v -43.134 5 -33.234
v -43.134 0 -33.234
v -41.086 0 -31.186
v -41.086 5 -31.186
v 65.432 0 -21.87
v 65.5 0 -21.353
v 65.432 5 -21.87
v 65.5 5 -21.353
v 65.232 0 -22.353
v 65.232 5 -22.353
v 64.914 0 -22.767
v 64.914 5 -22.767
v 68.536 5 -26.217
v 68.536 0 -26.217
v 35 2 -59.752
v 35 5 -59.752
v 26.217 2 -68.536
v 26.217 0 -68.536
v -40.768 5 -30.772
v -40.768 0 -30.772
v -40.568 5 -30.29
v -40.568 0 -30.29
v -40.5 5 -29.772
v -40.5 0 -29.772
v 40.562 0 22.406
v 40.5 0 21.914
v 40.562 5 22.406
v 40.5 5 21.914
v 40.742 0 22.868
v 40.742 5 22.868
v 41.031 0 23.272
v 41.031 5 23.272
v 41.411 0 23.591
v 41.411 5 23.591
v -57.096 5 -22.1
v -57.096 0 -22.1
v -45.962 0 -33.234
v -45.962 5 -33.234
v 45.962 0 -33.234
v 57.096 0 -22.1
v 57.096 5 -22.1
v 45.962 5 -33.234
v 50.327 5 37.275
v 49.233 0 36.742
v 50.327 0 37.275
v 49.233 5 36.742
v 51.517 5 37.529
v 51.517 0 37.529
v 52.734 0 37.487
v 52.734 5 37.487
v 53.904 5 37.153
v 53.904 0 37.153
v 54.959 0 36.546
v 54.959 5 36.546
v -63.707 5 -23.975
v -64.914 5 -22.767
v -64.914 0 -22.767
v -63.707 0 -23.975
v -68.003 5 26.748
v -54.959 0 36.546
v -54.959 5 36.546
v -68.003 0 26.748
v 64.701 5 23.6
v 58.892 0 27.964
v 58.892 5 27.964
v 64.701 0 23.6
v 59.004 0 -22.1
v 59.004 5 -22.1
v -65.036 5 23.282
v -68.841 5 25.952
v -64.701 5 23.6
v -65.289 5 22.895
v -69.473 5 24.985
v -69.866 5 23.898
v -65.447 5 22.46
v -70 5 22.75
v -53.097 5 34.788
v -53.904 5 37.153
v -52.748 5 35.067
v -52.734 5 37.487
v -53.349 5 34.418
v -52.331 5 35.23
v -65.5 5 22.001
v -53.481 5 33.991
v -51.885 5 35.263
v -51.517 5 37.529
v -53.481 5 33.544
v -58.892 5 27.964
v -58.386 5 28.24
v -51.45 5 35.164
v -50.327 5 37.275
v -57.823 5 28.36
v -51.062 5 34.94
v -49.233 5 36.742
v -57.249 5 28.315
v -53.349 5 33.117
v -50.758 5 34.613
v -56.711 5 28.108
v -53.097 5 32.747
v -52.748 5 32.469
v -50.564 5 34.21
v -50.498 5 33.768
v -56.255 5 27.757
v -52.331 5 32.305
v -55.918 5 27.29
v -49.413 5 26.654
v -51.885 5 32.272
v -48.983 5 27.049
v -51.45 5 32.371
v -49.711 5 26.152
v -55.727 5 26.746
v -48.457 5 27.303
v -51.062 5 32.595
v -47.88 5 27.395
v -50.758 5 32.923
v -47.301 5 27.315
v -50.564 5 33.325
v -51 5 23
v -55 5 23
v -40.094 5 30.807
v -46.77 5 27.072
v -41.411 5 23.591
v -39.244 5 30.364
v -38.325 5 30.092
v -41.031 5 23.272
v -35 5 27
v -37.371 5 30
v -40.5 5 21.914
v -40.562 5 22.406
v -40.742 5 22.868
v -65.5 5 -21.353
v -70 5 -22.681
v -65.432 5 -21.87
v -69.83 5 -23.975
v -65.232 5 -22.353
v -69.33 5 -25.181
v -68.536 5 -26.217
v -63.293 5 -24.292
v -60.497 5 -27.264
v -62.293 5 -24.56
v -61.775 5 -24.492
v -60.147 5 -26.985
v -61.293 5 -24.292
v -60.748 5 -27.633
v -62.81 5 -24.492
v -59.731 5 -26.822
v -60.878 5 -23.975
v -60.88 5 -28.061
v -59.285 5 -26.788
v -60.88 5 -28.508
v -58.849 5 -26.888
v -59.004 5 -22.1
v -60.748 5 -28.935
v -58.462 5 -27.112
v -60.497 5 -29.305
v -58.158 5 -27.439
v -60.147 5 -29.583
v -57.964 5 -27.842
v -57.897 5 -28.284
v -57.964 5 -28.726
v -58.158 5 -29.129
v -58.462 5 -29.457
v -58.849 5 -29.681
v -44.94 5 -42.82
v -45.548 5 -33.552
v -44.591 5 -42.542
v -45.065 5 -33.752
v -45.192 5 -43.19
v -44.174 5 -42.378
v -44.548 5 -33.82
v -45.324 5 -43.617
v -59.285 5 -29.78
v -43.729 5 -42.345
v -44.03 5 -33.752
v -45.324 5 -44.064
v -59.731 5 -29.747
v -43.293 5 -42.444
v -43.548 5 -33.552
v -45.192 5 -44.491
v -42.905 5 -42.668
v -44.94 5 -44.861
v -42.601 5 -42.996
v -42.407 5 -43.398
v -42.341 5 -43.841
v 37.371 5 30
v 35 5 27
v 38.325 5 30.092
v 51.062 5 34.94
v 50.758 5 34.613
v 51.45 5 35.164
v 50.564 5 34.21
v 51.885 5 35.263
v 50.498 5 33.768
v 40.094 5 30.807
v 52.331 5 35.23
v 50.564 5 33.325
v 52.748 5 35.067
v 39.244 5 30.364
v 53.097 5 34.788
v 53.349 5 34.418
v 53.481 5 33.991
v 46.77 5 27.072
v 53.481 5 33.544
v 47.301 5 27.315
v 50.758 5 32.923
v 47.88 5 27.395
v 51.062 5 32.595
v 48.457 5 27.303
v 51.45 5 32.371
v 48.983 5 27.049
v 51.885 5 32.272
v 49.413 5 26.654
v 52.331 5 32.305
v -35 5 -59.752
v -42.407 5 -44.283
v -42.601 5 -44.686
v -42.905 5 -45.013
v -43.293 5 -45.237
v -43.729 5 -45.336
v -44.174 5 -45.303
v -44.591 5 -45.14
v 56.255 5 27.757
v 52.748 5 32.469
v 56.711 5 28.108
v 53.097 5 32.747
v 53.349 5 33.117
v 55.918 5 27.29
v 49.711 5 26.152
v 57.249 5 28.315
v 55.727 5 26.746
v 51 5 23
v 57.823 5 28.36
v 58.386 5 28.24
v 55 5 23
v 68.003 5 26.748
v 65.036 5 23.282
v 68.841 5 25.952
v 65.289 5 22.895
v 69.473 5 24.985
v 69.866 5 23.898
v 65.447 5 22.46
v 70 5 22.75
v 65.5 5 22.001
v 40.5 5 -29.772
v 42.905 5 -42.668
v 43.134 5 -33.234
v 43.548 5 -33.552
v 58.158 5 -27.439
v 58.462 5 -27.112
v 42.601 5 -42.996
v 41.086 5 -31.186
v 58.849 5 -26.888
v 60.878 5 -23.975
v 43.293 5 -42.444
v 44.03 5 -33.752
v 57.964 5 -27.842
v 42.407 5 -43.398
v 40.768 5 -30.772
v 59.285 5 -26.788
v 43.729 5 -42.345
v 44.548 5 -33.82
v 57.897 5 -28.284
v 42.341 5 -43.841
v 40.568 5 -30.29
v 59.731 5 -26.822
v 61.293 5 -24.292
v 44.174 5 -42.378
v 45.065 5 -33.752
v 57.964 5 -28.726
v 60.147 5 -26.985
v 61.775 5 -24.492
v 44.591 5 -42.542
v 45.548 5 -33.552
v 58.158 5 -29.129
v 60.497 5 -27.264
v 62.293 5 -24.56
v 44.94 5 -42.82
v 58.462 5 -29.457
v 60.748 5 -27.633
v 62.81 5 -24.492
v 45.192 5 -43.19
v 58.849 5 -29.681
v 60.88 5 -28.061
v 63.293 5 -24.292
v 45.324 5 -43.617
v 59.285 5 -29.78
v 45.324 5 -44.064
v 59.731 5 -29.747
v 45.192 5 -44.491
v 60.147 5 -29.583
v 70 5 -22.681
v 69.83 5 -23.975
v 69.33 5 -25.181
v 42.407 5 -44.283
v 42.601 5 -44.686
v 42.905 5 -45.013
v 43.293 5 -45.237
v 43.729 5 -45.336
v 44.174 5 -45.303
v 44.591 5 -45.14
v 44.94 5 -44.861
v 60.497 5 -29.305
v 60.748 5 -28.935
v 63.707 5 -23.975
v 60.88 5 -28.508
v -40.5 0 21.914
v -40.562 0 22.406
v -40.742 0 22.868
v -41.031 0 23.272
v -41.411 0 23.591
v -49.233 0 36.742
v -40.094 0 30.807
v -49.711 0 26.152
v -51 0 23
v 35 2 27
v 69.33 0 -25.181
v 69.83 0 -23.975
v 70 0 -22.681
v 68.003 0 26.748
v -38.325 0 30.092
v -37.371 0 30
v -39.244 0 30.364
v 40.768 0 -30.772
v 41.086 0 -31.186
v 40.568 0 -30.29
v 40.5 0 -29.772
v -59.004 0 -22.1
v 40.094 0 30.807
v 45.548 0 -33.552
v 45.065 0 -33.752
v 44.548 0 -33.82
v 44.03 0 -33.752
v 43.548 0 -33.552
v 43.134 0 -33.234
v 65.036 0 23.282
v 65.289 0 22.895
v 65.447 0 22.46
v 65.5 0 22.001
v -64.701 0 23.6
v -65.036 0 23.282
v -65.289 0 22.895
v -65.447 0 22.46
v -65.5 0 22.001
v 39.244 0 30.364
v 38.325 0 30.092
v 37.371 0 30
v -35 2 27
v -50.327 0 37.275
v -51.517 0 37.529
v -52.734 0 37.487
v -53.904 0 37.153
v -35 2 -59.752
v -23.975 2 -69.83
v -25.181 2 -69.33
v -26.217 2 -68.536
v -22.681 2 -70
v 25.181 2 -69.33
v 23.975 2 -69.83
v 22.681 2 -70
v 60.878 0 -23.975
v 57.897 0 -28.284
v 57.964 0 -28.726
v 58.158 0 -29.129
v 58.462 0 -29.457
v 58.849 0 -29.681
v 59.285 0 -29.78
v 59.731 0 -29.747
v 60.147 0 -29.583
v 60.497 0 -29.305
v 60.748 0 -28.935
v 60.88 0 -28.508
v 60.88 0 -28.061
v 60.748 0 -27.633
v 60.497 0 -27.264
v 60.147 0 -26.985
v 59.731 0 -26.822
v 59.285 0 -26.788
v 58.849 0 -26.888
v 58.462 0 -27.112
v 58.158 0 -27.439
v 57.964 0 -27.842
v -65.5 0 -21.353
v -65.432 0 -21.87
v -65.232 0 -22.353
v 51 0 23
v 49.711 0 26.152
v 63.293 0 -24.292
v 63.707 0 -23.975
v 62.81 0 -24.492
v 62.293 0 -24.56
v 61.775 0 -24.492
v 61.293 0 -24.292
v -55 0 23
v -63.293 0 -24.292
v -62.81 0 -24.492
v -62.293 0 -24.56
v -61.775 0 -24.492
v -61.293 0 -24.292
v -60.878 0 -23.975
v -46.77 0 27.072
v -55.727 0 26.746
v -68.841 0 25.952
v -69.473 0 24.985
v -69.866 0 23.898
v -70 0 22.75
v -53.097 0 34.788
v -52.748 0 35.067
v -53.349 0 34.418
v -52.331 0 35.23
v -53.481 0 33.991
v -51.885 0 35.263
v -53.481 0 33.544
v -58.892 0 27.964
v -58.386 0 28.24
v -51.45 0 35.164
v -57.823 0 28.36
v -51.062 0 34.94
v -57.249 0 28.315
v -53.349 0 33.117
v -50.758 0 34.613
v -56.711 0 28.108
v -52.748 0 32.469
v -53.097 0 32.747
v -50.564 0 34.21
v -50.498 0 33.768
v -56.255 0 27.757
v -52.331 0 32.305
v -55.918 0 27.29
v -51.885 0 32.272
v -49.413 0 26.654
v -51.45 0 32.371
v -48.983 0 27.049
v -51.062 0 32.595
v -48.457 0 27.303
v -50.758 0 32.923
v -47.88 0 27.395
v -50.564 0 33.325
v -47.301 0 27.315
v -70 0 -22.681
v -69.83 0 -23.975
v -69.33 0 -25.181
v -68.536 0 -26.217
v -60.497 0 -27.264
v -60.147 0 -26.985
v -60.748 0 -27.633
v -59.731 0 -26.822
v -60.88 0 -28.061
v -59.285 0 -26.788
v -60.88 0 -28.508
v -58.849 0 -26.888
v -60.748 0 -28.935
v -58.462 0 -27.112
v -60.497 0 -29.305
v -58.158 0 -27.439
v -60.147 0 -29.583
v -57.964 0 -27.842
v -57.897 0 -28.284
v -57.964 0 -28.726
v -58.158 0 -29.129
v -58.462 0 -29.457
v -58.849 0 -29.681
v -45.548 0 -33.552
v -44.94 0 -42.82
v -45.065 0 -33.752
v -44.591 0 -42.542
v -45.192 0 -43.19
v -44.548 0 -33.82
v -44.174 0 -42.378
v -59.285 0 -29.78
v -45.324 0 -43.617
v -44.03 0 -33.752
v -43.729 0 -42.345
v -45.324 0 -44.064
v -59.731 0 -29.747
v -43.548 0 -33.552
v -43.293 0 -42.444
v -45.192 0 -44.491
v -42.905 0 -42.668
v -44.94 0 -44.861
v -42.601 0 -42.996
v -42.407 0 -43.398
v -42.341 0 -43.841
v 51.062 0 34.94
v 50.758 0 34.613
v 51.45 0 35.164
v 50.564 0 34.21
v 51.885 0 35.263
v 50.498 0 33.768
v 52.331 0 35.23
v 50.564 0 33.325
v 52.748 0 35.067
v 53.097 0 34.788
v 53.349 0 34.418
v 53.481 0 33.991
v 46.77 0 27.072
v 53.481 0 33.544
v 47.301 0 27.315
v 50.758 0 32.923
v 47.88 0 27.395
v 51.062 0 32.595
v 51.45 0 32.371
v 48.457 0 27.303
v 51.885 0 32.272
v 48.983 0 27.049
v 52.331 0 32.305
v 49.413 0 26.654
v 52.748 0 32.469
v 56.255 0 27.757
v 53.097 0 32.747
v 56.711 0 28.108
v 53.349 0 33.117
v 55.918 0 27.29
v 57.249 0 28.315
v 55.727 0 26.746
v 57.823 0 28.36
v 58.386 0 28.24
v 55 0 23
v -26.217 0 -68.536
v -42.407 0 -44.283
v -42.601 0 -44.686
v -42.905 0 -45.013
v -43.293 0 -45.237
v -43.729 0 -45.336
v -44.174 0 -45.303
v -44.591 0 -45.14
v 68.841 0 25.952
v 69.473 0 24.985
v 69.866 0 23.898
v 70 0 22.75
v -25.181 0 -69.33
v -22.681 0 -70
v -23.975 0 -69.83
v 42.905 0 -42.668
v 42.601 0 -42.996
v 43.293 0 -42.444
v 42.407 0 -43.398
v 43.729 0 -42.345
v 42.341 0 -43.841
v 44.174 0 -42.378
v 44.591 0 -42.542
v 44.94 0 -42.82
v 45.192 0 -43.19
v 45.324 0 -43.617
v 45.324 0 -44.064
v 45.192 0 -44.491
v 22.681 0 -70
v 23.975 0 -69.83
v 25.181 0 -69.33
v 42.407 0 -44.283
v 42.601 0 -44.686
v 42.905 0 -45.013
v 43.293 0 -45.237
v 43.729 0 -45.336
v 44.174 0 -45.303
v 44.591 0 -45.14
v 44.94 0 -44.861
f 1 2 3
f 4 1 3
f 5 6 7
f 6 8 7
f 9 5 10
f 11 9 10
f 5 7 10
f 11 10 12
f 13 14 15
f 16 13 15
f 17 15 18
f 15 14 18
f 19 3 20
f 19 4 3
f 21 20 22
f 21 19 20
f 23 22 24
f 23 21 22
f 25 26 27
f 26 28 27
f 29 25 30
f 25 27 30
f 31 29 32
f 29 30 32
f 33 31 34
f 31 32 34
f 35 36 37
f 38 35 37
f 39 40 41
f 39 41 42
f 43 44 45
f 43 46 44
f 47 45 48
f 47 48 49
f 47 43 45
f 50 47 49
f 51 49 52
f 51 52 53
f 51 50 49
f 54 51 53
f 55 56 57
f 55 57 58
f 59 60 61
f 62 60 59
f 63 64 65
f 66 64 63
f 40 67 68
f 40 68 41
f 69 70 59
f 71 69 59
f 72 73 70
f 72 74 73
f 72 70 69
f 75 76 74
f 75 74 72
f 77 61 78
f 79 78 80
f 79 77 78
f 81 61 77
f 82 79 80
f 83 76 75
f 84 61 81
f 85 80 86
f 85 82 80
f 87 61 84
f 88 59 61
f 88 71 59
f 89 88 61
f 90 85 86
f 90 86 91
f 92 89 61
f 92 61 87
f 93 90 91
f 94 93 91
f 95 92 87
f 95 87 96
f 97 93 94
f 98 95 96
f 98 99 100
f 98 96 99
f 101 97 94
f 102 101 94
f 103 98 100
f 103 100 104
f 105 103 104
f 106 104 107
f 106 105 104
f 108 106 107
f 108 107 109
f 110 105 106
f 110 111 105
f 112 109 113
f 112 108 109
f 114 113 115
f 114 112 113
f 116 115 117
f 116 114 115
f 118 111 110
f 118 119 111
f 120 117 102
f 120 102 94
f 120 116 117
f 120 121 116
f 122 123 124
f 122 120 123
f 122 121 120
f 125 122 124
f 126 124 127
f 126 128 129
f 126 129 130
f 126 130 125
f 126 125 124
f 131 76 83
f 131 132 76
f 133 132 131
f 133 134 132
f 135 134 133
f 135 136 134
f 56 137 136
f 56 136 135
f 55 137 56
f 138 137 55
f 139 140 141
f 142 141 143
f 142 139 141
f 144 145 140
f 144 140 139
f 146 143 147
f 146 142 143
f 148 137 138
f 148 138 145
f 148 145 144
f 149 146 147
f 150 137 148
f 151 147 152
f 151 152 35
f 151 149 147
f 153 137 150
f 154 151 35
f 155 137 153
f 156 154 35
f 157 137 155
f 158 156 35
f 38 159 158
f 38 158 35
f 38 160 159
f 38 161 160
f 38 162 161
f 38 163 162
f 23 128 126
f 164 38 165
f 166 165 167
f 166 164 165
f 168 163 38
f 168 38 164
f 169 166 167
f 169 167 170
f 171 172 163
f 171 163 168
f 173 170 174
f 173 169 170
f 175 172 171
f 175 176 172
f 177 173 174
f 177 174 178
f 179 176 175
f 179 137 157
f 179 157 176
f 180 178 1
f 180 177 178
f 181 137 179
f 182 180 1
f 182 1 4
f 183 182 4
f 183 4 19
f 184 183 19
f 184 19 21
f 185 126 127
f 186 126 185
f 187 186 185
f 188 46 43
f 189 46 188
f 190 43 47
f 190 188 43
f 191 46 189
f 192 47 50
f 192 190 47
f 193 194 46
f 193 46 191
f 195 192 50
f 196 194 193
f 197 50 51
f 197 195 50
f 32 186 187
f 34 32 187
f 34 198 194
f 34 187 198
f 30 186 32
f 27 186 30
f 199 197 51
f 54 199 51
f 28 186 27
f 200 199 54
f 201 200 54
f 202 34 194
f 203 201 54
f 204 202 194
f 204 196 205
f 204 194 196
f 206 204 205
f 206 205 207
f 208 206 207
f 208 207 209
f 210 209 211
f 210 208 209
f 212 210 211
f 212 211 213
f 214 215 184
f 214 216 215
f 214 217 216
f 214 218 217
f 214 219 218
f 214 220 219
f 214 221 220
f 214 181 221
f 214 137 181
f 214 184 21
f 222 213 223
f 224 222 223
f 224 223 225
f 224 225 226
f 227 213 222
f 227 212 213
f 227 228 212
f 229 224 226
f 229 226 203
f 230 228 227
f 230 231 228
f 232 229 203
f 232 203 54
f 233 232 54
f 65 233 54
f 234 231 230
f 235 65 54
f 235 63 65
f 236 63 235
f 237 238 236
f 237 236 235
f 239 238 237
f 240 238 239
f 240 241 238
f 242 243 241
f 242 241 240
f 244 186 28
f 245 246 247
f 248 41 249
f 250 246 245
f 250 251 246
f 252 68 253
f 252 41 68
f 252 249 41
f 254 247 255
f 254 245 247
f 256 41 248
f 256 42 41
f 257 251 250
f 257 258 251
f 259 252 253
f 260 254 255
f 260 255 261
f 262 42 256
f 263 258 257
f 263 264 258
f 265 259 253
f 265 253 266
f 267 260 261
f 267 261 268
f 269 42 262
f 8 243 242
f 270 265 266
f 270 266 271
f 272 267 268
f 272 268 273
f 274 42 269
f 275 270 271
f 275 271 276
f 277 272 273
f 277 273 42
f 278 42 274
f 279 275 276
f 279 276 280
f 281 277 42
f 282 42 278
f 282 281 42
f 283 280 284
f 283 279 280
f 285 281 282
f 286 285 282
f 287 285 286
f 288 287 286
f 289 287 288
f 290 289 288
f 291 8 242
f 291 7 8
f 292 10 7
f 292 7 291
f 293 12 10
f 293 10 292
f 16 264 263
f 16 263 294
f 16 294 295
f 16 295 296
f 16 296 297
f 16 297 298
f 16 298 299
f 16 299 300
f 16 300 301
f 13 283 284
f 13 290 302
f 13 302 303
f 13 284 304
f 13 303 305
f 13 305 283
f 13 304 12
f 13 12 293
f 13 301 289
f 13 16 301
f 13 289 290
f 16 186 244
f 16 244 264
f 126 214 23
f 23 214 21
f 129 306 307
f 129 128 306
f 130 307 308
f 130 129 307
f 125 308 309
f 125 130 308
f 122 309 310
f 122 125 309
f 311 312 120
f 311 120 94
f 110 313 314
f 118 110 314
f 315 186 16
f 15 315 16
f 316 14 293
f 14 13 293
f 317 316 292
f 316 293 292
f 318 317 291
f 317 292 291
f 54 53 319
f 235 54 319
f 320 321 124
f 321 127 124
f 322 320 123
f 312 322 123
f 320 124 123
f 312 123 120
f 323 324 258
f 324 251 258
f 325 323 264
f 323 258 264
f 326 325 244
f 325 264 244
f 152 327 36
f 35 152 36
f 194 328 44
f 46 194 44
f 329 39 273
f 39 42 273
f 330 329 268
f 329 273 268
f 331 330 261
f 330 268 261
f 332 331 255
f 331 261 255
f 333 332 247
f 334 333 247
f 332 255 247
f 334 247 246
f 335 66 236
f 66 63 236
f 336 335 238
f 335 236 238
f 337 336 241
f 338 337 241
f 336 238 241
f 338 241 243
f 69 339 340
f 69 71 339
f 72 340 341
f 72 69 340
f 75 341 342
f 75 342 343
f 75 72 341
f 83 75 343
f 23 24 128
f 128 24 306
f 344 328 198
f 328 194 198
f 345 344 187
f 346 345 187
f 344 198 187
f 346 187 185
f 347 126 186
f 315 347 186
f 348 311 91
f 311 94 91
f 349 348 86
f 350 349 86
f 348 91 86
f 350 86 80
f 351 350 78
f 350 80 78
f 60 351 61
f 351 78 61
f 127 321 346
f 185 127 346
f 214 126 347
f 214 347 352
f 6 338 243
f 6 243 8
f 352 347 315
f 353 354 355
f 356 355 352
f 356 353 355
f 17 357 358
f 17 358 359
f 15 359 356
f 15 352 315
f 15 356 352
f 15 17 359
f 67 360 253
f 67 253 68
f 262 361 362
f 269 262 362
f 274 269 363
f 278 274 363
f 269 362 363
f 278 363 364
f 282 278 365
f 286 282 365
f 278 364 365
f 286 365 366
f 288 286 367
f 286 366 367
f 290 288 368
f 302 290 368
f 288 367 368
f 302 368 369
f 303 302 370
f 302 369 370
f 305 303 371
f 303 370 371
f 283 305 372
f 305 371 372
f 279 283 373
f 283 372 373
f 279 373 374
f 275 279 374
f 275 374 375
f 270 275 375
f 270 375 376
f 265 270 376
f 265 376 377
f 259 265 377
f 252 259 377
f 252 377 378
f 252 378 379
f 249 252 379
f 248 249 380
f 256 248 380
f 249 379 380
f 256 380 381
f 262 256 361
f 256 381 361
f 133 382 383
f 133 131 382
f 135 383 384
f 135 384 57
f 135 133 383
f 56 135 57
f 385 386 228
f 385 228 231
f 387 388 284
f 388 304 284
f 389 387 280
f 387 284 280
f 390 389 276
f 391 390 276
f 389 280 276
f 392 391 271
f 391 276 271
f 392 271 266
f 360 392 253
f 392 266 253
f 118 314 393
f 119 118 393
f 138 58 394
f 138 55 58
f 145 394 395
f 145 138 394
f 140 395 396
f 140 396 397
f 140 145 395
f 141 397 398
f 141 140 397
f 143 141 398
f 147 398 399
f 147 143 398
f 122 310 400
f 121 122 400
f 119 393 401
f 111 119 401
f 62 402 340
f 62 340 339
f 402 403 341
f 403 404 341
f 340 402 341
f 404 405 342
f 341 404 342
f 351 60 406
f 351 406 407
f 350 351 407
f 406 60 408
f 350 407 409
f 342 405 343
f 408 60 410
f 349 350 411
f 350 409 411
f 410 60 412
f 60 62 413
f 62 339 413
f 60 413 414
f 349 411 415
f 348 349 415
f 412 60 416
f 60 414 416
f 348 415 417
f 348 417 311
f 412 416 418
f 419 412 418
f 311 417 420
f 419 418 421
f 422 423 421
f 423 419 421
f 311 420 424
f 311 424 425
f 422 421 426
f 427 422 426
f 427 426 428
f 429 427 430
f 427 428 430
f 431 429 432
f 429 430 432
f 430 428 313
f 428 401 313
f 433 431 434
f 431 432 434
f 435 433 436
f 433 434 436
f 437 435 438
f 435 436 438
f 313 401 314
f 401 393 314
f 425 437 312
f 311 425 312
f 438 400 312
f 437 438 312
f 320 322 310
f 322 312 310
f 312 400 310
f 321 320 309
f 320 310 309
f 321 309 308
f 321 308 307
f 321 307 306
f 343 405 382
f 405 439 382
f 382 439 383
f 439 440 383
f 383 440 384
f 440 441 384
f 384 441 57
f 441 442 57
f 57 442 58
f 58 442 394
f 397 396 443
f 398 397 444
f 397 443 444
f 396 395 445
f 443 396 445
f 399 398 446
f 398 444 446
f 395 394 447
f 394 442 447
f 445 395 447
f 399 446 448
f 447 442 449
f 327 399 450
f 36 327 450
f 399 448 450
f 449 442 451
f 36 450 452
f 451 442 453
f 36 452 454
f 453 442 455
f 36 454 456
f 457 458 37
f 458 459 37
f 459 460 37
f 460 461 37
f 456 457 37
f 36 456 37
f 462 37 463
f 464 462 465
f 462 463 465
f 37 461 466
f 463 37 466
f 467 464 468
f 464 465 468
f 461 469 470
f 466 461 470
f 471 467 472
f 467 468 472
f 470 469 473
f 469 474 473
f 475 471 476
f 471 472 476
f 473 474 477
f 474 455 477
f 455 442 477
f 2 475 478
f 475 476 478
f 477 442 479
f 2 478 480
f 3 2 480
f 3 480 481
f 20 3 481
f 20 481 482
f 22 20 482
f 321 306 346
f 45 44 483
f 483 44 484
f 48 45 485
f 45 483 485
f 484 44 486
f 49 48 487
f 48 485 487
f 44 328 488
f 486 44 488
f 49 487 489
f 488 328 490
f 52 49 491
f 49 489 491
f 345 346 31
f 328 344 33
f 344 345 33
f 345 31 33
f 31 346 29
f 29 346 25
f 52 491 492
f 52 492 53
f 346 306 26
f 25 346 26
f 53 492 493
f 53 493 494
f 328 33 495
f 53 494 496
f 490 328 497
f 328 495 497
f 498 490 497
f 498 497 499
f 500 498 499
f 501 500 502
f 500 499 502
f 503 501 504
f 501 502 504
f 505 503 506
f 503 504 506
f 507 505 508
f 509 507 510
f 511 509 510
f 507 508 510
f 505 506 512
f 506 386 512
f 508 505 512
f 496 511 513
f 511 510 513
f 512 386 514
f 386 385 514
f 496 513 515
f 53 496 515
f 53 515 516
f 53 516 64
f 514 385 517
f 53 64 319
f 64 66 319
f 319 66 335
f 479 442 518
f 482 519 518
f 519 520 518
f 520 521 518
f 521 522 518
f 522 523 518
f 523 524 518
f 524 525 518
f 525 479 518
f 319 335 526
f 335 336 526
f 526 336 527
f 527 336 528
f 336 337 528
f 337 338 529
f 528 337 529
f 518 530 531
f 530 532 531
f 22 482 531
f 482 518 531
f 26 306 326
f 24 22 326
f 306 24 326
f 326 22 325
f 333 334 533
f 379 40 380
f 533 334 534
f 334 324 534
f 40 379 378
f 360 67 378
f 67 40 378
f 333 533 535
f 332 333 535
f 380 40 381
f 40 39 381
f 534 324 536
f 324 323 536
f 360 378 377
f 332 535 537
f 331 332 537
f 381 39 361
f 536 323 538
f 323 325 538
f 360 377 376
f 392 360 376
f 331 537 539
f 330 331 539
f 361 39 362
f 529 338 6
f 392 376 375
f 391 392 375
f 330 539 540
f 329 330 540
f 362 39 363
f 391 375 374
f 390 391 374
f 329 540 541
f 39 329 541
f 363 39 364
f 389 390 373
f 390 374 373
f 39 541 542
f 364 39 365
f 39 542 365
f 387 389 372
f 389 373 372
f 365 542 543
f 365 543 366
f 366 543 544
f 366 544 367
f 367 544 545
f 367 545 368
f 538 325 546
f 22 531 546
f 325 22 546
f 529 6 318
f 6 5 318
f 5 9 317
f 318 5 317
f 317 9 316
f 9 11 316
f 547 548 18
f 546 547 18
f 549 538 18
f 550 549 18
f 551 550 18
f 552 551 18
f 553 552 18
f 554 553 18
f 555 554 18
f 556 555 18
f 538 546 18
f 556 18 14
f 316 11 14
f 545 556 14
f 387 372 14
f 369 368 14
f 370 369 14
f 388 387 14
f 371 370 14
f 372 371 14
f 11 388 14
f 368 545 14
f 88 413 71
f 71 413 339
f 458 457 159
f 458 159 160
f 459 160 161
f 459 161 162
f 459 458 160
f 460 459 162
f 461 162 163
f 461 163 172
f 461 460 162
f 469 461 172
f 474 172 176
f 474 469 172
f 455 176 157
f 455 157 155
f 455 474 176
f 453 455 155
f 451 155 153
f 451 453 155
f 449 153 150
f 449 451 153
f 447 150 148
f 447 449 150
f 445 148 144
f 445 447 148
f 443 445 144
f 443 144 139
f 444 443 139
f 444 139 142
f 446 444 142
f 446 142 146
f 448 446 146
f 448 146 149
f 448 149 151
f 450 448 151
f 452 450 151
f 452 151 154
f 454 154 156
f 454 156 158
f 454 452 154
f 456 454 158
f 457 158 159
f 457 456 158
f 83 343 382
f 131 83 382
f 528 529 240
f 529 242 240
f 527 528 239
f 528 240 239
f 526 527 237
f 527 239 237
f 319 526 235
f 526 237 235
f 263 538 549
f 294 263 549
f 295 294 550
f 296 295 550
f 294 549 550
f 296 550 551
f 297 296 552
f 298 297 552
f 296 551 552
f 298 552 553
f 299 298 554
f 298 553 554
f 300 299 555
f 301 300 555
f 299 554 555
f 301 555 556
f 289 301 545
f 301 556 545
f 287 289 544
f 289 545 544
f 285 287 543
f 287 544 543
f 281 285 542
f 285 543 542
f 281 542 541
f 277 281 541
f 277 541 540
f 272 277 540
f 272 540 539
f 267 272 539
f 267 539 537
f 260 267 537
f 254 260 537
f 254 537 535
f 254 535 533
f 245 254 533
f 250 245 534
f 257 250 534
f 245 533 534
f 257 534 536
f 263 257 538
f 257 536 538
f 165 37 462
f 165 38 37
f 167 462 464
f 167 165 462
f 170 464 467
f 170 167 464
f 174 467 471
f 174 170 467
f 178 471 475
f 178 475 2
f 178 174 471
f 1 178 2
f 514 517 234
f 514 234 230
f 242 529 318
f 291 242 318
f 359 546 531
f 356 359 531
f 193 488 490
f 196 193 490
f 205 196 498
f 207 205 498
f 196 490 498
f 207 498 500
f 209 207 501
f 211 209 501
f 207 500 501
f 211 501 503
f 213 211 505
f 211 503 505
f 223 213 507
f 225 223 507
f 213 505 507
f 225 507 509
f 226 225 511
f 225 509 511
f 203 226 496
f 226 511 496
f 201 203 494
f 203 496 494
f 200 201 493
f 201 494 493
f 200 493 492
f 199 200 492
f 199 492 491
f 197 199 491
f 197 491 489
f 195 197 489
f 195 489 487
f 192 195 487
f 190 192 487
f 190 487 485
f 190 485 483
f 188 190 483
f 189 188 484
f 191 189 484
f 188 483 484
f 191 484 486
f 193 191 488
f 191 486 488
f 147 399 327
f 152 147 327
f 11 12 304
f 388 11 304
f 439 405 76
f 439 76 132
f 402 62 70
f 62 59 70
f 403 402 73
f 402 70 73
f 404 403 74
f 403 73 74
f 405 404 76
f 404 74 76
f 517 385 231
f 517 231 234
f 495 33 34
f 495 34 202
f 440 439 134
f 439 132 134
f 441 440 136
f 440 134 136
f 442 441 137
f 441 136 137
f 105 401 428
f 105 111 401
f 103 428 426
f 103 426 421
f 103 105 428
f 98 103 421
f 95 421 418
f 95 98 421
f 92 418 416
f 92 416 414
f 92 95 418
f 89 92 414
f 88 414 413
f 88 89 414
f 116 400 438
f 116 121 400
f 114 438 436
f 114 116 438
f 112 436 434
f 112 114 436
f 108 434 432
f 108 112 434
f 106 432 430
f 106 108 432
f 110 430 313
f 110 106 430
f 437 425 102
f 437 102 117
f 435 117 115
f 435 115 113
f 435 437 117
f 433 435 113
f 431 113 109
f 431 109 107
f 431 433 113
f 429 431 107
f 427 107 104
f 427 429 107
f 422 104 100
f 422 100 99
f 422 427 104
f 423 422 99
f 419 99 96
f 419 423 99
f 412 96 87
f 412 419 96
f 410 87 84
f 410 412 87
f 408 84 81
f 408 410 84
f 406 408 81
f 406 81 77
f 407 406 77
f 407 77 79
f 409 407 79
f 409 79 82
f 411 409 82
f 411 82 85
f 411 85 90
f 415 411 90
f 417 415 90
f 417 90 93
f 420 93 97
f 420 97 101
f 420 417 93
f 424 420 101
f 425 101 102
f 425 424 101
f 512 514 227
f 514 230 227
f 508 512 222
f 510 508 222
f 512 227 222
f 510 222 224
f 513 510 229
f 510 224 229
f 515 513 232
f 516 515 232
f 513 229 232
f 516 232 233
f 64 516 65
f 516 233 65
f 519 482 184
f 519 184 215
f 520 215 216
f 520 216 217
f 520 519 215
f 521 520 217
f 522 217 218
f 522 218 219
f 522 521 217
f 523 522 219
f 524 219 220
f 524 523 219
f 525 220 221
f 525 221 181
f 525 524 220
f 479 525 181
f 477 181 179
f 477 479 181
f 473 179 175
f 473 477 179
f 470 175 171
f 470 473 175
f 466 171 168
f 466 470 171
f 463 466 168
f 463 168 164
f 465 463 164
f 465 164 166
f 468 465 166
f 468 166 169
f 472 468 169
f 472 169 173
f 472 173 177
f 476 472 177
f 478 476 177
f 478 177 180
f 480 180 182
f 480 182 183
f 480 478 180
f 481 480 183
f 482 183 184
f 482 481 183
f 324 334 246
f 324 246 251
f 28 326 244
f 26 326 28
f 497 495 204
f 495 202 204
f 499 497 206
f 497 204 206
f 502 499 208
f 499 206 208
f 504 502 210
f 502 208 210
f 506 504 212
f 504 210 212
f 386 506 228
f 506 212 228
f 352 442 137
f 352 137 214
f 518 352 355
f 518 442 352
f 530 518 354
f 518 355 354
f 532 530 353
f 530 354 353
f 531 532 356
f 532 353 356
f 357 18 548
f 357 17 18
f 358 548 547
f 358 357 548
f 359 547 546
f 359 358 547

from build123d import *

# Parameters (mm, degrees)
SKETCH1_R            = 1.5
BOSS_EXTRUDE1_DEPTH  = 5
FILLET1_R            = 2
FILLET1_OF_MIRROR1_R = 2
SKETCH2_W            = 70
SKETCH2_H            = 97
CUT_EXTRUDE1_DEPTH   = 3
FILLET2_R            = 5


with BuildPart() as part:
    # Sketch1 → Boss-Extrude1 (new body)
    with BuildSketch(Plane(origin=(0, 0, 0), x_dir=(1, 0, 0), z_dir=(0, 1, 0))):
        Polygon((-52.164149312, -38.645247828), (-70, -25.247940817), (-70, 24.752308679), (-24.752308679, 70), (0, 70), (0, -30), (-38.851635079, -30), align=None)
        with Locations((-43.840620434, 43.840620434)):
            Circle(SKETCH1_R, mode=Mode.SUBTRACT)
        with Locations((-51.997575213, -33.767620171)):
            Circle(SKETCH1_R, mode=Mode.SUBTRACT)
        with Locations((-59.39696962, 28.284271247)):
            Circle(SKETCH1_R, mode=Mode.SUBTRACT)
        Polygon((-59.003765723, 22.1), (-57.095959493, 22.1), (-44.547727215, 34.648232278), (-40.5, 30.600505063), (-40.5, -23), (-48.796166422, -28.387593469), (-51, -23), (-55, -23), (-56.33662338, -29.883022962), (-65.5, -23), (-65.5, 22.181240867), (-62.292503295, 25.388737572), align=None, mode=Mode.SUBTRACT)
    boss_extrude1 = extrude(amount=BOSS_EXTRUDE1_DEPTH)

    # Fillet1
    fillet1_edges = [part.edges().sort_by_distance(p)[0] for p in [
        (-44.547727215, 2.5, -34.648232278),
        (-62.292503295, 2.5, -25.388737572),
        (-65.5, 2.5, -22.181240867),
        (-65.5, 2.5, 23),
        (-56.33662338, 2.5, 29.883022962),
        (-48.796166422, 2.5, 28.387593469),
        (-40.5, 2.5, 23),
        (-40.5, 2.5, -30.600505063),
    ]]
    fillet(fillet1_edges, radius=FILLET1_R)

    # Mirror1: Boss-Extrude1 across plane
    add(boss_extrude1.mirror(Plane(origin=(0, 5, 30), x_dir=(0, 0, 1), z_dir=(-1, 0, 0))))

    # Fillet1 of Mirror1
    fillet1_of_mirror1_edges = [part.edges().sort_by_distance(p)[0] for p in [
        (44.547727215, 2.5, -34.648232278),
        (62.292503295, 2.5, -25.388737572),
        (65.5, 2.5, -22.181240867),
        (65.5, 2.5, 23),
        (56.33662338, 2.5, 29.883022962),
        (48.796166422, 2.5, 28.387593469),
        (40.5, 2.5, 23),
        (40.5, 2.5, -30.600505063),
    ]]
    fillet(fillet1_of_mirror1_edges, radius=FILLET1_OF_MIRROR1_R)

    # Sketch2 → Cut-Extrude1 (cut)
    with BuildSketch(Plane(origin=(0, 5, 0), x_dir=(1, 0, 0), z_dir=(0, 1, 0))):
        with Locations((0, 21.5)):
            Rectangle(SKETCH2_W, SKETCH2_H)
    extrude(amount=-CUT_EXTRUDE1_DEPTH, mode=Mode.SUBTRACT)

    # Fillet2
    fillet2_edges = [part.edges().sort_by_distance(p)[0] for p in [
        (-70, 2.5, -24.752308679),
        (70, 2.5, 25.247940817),
        (70, 2.5, -24.752308679),
        (38.851635079, 2.5, 30),
        (-38.851635079, 2.5, 30),
        (52.164149312, 2.5, 38.645247828),
        (-52.164149312, 2.5, 38.645247828),
        (-70, 2.5, 25.247940817),
        (24.752308679, 1, -70),
        (-24.752308679, 1, -70),
    ]]
    fillet(fillet2_edges, radius=FILLET2_R)


solid = part.part
